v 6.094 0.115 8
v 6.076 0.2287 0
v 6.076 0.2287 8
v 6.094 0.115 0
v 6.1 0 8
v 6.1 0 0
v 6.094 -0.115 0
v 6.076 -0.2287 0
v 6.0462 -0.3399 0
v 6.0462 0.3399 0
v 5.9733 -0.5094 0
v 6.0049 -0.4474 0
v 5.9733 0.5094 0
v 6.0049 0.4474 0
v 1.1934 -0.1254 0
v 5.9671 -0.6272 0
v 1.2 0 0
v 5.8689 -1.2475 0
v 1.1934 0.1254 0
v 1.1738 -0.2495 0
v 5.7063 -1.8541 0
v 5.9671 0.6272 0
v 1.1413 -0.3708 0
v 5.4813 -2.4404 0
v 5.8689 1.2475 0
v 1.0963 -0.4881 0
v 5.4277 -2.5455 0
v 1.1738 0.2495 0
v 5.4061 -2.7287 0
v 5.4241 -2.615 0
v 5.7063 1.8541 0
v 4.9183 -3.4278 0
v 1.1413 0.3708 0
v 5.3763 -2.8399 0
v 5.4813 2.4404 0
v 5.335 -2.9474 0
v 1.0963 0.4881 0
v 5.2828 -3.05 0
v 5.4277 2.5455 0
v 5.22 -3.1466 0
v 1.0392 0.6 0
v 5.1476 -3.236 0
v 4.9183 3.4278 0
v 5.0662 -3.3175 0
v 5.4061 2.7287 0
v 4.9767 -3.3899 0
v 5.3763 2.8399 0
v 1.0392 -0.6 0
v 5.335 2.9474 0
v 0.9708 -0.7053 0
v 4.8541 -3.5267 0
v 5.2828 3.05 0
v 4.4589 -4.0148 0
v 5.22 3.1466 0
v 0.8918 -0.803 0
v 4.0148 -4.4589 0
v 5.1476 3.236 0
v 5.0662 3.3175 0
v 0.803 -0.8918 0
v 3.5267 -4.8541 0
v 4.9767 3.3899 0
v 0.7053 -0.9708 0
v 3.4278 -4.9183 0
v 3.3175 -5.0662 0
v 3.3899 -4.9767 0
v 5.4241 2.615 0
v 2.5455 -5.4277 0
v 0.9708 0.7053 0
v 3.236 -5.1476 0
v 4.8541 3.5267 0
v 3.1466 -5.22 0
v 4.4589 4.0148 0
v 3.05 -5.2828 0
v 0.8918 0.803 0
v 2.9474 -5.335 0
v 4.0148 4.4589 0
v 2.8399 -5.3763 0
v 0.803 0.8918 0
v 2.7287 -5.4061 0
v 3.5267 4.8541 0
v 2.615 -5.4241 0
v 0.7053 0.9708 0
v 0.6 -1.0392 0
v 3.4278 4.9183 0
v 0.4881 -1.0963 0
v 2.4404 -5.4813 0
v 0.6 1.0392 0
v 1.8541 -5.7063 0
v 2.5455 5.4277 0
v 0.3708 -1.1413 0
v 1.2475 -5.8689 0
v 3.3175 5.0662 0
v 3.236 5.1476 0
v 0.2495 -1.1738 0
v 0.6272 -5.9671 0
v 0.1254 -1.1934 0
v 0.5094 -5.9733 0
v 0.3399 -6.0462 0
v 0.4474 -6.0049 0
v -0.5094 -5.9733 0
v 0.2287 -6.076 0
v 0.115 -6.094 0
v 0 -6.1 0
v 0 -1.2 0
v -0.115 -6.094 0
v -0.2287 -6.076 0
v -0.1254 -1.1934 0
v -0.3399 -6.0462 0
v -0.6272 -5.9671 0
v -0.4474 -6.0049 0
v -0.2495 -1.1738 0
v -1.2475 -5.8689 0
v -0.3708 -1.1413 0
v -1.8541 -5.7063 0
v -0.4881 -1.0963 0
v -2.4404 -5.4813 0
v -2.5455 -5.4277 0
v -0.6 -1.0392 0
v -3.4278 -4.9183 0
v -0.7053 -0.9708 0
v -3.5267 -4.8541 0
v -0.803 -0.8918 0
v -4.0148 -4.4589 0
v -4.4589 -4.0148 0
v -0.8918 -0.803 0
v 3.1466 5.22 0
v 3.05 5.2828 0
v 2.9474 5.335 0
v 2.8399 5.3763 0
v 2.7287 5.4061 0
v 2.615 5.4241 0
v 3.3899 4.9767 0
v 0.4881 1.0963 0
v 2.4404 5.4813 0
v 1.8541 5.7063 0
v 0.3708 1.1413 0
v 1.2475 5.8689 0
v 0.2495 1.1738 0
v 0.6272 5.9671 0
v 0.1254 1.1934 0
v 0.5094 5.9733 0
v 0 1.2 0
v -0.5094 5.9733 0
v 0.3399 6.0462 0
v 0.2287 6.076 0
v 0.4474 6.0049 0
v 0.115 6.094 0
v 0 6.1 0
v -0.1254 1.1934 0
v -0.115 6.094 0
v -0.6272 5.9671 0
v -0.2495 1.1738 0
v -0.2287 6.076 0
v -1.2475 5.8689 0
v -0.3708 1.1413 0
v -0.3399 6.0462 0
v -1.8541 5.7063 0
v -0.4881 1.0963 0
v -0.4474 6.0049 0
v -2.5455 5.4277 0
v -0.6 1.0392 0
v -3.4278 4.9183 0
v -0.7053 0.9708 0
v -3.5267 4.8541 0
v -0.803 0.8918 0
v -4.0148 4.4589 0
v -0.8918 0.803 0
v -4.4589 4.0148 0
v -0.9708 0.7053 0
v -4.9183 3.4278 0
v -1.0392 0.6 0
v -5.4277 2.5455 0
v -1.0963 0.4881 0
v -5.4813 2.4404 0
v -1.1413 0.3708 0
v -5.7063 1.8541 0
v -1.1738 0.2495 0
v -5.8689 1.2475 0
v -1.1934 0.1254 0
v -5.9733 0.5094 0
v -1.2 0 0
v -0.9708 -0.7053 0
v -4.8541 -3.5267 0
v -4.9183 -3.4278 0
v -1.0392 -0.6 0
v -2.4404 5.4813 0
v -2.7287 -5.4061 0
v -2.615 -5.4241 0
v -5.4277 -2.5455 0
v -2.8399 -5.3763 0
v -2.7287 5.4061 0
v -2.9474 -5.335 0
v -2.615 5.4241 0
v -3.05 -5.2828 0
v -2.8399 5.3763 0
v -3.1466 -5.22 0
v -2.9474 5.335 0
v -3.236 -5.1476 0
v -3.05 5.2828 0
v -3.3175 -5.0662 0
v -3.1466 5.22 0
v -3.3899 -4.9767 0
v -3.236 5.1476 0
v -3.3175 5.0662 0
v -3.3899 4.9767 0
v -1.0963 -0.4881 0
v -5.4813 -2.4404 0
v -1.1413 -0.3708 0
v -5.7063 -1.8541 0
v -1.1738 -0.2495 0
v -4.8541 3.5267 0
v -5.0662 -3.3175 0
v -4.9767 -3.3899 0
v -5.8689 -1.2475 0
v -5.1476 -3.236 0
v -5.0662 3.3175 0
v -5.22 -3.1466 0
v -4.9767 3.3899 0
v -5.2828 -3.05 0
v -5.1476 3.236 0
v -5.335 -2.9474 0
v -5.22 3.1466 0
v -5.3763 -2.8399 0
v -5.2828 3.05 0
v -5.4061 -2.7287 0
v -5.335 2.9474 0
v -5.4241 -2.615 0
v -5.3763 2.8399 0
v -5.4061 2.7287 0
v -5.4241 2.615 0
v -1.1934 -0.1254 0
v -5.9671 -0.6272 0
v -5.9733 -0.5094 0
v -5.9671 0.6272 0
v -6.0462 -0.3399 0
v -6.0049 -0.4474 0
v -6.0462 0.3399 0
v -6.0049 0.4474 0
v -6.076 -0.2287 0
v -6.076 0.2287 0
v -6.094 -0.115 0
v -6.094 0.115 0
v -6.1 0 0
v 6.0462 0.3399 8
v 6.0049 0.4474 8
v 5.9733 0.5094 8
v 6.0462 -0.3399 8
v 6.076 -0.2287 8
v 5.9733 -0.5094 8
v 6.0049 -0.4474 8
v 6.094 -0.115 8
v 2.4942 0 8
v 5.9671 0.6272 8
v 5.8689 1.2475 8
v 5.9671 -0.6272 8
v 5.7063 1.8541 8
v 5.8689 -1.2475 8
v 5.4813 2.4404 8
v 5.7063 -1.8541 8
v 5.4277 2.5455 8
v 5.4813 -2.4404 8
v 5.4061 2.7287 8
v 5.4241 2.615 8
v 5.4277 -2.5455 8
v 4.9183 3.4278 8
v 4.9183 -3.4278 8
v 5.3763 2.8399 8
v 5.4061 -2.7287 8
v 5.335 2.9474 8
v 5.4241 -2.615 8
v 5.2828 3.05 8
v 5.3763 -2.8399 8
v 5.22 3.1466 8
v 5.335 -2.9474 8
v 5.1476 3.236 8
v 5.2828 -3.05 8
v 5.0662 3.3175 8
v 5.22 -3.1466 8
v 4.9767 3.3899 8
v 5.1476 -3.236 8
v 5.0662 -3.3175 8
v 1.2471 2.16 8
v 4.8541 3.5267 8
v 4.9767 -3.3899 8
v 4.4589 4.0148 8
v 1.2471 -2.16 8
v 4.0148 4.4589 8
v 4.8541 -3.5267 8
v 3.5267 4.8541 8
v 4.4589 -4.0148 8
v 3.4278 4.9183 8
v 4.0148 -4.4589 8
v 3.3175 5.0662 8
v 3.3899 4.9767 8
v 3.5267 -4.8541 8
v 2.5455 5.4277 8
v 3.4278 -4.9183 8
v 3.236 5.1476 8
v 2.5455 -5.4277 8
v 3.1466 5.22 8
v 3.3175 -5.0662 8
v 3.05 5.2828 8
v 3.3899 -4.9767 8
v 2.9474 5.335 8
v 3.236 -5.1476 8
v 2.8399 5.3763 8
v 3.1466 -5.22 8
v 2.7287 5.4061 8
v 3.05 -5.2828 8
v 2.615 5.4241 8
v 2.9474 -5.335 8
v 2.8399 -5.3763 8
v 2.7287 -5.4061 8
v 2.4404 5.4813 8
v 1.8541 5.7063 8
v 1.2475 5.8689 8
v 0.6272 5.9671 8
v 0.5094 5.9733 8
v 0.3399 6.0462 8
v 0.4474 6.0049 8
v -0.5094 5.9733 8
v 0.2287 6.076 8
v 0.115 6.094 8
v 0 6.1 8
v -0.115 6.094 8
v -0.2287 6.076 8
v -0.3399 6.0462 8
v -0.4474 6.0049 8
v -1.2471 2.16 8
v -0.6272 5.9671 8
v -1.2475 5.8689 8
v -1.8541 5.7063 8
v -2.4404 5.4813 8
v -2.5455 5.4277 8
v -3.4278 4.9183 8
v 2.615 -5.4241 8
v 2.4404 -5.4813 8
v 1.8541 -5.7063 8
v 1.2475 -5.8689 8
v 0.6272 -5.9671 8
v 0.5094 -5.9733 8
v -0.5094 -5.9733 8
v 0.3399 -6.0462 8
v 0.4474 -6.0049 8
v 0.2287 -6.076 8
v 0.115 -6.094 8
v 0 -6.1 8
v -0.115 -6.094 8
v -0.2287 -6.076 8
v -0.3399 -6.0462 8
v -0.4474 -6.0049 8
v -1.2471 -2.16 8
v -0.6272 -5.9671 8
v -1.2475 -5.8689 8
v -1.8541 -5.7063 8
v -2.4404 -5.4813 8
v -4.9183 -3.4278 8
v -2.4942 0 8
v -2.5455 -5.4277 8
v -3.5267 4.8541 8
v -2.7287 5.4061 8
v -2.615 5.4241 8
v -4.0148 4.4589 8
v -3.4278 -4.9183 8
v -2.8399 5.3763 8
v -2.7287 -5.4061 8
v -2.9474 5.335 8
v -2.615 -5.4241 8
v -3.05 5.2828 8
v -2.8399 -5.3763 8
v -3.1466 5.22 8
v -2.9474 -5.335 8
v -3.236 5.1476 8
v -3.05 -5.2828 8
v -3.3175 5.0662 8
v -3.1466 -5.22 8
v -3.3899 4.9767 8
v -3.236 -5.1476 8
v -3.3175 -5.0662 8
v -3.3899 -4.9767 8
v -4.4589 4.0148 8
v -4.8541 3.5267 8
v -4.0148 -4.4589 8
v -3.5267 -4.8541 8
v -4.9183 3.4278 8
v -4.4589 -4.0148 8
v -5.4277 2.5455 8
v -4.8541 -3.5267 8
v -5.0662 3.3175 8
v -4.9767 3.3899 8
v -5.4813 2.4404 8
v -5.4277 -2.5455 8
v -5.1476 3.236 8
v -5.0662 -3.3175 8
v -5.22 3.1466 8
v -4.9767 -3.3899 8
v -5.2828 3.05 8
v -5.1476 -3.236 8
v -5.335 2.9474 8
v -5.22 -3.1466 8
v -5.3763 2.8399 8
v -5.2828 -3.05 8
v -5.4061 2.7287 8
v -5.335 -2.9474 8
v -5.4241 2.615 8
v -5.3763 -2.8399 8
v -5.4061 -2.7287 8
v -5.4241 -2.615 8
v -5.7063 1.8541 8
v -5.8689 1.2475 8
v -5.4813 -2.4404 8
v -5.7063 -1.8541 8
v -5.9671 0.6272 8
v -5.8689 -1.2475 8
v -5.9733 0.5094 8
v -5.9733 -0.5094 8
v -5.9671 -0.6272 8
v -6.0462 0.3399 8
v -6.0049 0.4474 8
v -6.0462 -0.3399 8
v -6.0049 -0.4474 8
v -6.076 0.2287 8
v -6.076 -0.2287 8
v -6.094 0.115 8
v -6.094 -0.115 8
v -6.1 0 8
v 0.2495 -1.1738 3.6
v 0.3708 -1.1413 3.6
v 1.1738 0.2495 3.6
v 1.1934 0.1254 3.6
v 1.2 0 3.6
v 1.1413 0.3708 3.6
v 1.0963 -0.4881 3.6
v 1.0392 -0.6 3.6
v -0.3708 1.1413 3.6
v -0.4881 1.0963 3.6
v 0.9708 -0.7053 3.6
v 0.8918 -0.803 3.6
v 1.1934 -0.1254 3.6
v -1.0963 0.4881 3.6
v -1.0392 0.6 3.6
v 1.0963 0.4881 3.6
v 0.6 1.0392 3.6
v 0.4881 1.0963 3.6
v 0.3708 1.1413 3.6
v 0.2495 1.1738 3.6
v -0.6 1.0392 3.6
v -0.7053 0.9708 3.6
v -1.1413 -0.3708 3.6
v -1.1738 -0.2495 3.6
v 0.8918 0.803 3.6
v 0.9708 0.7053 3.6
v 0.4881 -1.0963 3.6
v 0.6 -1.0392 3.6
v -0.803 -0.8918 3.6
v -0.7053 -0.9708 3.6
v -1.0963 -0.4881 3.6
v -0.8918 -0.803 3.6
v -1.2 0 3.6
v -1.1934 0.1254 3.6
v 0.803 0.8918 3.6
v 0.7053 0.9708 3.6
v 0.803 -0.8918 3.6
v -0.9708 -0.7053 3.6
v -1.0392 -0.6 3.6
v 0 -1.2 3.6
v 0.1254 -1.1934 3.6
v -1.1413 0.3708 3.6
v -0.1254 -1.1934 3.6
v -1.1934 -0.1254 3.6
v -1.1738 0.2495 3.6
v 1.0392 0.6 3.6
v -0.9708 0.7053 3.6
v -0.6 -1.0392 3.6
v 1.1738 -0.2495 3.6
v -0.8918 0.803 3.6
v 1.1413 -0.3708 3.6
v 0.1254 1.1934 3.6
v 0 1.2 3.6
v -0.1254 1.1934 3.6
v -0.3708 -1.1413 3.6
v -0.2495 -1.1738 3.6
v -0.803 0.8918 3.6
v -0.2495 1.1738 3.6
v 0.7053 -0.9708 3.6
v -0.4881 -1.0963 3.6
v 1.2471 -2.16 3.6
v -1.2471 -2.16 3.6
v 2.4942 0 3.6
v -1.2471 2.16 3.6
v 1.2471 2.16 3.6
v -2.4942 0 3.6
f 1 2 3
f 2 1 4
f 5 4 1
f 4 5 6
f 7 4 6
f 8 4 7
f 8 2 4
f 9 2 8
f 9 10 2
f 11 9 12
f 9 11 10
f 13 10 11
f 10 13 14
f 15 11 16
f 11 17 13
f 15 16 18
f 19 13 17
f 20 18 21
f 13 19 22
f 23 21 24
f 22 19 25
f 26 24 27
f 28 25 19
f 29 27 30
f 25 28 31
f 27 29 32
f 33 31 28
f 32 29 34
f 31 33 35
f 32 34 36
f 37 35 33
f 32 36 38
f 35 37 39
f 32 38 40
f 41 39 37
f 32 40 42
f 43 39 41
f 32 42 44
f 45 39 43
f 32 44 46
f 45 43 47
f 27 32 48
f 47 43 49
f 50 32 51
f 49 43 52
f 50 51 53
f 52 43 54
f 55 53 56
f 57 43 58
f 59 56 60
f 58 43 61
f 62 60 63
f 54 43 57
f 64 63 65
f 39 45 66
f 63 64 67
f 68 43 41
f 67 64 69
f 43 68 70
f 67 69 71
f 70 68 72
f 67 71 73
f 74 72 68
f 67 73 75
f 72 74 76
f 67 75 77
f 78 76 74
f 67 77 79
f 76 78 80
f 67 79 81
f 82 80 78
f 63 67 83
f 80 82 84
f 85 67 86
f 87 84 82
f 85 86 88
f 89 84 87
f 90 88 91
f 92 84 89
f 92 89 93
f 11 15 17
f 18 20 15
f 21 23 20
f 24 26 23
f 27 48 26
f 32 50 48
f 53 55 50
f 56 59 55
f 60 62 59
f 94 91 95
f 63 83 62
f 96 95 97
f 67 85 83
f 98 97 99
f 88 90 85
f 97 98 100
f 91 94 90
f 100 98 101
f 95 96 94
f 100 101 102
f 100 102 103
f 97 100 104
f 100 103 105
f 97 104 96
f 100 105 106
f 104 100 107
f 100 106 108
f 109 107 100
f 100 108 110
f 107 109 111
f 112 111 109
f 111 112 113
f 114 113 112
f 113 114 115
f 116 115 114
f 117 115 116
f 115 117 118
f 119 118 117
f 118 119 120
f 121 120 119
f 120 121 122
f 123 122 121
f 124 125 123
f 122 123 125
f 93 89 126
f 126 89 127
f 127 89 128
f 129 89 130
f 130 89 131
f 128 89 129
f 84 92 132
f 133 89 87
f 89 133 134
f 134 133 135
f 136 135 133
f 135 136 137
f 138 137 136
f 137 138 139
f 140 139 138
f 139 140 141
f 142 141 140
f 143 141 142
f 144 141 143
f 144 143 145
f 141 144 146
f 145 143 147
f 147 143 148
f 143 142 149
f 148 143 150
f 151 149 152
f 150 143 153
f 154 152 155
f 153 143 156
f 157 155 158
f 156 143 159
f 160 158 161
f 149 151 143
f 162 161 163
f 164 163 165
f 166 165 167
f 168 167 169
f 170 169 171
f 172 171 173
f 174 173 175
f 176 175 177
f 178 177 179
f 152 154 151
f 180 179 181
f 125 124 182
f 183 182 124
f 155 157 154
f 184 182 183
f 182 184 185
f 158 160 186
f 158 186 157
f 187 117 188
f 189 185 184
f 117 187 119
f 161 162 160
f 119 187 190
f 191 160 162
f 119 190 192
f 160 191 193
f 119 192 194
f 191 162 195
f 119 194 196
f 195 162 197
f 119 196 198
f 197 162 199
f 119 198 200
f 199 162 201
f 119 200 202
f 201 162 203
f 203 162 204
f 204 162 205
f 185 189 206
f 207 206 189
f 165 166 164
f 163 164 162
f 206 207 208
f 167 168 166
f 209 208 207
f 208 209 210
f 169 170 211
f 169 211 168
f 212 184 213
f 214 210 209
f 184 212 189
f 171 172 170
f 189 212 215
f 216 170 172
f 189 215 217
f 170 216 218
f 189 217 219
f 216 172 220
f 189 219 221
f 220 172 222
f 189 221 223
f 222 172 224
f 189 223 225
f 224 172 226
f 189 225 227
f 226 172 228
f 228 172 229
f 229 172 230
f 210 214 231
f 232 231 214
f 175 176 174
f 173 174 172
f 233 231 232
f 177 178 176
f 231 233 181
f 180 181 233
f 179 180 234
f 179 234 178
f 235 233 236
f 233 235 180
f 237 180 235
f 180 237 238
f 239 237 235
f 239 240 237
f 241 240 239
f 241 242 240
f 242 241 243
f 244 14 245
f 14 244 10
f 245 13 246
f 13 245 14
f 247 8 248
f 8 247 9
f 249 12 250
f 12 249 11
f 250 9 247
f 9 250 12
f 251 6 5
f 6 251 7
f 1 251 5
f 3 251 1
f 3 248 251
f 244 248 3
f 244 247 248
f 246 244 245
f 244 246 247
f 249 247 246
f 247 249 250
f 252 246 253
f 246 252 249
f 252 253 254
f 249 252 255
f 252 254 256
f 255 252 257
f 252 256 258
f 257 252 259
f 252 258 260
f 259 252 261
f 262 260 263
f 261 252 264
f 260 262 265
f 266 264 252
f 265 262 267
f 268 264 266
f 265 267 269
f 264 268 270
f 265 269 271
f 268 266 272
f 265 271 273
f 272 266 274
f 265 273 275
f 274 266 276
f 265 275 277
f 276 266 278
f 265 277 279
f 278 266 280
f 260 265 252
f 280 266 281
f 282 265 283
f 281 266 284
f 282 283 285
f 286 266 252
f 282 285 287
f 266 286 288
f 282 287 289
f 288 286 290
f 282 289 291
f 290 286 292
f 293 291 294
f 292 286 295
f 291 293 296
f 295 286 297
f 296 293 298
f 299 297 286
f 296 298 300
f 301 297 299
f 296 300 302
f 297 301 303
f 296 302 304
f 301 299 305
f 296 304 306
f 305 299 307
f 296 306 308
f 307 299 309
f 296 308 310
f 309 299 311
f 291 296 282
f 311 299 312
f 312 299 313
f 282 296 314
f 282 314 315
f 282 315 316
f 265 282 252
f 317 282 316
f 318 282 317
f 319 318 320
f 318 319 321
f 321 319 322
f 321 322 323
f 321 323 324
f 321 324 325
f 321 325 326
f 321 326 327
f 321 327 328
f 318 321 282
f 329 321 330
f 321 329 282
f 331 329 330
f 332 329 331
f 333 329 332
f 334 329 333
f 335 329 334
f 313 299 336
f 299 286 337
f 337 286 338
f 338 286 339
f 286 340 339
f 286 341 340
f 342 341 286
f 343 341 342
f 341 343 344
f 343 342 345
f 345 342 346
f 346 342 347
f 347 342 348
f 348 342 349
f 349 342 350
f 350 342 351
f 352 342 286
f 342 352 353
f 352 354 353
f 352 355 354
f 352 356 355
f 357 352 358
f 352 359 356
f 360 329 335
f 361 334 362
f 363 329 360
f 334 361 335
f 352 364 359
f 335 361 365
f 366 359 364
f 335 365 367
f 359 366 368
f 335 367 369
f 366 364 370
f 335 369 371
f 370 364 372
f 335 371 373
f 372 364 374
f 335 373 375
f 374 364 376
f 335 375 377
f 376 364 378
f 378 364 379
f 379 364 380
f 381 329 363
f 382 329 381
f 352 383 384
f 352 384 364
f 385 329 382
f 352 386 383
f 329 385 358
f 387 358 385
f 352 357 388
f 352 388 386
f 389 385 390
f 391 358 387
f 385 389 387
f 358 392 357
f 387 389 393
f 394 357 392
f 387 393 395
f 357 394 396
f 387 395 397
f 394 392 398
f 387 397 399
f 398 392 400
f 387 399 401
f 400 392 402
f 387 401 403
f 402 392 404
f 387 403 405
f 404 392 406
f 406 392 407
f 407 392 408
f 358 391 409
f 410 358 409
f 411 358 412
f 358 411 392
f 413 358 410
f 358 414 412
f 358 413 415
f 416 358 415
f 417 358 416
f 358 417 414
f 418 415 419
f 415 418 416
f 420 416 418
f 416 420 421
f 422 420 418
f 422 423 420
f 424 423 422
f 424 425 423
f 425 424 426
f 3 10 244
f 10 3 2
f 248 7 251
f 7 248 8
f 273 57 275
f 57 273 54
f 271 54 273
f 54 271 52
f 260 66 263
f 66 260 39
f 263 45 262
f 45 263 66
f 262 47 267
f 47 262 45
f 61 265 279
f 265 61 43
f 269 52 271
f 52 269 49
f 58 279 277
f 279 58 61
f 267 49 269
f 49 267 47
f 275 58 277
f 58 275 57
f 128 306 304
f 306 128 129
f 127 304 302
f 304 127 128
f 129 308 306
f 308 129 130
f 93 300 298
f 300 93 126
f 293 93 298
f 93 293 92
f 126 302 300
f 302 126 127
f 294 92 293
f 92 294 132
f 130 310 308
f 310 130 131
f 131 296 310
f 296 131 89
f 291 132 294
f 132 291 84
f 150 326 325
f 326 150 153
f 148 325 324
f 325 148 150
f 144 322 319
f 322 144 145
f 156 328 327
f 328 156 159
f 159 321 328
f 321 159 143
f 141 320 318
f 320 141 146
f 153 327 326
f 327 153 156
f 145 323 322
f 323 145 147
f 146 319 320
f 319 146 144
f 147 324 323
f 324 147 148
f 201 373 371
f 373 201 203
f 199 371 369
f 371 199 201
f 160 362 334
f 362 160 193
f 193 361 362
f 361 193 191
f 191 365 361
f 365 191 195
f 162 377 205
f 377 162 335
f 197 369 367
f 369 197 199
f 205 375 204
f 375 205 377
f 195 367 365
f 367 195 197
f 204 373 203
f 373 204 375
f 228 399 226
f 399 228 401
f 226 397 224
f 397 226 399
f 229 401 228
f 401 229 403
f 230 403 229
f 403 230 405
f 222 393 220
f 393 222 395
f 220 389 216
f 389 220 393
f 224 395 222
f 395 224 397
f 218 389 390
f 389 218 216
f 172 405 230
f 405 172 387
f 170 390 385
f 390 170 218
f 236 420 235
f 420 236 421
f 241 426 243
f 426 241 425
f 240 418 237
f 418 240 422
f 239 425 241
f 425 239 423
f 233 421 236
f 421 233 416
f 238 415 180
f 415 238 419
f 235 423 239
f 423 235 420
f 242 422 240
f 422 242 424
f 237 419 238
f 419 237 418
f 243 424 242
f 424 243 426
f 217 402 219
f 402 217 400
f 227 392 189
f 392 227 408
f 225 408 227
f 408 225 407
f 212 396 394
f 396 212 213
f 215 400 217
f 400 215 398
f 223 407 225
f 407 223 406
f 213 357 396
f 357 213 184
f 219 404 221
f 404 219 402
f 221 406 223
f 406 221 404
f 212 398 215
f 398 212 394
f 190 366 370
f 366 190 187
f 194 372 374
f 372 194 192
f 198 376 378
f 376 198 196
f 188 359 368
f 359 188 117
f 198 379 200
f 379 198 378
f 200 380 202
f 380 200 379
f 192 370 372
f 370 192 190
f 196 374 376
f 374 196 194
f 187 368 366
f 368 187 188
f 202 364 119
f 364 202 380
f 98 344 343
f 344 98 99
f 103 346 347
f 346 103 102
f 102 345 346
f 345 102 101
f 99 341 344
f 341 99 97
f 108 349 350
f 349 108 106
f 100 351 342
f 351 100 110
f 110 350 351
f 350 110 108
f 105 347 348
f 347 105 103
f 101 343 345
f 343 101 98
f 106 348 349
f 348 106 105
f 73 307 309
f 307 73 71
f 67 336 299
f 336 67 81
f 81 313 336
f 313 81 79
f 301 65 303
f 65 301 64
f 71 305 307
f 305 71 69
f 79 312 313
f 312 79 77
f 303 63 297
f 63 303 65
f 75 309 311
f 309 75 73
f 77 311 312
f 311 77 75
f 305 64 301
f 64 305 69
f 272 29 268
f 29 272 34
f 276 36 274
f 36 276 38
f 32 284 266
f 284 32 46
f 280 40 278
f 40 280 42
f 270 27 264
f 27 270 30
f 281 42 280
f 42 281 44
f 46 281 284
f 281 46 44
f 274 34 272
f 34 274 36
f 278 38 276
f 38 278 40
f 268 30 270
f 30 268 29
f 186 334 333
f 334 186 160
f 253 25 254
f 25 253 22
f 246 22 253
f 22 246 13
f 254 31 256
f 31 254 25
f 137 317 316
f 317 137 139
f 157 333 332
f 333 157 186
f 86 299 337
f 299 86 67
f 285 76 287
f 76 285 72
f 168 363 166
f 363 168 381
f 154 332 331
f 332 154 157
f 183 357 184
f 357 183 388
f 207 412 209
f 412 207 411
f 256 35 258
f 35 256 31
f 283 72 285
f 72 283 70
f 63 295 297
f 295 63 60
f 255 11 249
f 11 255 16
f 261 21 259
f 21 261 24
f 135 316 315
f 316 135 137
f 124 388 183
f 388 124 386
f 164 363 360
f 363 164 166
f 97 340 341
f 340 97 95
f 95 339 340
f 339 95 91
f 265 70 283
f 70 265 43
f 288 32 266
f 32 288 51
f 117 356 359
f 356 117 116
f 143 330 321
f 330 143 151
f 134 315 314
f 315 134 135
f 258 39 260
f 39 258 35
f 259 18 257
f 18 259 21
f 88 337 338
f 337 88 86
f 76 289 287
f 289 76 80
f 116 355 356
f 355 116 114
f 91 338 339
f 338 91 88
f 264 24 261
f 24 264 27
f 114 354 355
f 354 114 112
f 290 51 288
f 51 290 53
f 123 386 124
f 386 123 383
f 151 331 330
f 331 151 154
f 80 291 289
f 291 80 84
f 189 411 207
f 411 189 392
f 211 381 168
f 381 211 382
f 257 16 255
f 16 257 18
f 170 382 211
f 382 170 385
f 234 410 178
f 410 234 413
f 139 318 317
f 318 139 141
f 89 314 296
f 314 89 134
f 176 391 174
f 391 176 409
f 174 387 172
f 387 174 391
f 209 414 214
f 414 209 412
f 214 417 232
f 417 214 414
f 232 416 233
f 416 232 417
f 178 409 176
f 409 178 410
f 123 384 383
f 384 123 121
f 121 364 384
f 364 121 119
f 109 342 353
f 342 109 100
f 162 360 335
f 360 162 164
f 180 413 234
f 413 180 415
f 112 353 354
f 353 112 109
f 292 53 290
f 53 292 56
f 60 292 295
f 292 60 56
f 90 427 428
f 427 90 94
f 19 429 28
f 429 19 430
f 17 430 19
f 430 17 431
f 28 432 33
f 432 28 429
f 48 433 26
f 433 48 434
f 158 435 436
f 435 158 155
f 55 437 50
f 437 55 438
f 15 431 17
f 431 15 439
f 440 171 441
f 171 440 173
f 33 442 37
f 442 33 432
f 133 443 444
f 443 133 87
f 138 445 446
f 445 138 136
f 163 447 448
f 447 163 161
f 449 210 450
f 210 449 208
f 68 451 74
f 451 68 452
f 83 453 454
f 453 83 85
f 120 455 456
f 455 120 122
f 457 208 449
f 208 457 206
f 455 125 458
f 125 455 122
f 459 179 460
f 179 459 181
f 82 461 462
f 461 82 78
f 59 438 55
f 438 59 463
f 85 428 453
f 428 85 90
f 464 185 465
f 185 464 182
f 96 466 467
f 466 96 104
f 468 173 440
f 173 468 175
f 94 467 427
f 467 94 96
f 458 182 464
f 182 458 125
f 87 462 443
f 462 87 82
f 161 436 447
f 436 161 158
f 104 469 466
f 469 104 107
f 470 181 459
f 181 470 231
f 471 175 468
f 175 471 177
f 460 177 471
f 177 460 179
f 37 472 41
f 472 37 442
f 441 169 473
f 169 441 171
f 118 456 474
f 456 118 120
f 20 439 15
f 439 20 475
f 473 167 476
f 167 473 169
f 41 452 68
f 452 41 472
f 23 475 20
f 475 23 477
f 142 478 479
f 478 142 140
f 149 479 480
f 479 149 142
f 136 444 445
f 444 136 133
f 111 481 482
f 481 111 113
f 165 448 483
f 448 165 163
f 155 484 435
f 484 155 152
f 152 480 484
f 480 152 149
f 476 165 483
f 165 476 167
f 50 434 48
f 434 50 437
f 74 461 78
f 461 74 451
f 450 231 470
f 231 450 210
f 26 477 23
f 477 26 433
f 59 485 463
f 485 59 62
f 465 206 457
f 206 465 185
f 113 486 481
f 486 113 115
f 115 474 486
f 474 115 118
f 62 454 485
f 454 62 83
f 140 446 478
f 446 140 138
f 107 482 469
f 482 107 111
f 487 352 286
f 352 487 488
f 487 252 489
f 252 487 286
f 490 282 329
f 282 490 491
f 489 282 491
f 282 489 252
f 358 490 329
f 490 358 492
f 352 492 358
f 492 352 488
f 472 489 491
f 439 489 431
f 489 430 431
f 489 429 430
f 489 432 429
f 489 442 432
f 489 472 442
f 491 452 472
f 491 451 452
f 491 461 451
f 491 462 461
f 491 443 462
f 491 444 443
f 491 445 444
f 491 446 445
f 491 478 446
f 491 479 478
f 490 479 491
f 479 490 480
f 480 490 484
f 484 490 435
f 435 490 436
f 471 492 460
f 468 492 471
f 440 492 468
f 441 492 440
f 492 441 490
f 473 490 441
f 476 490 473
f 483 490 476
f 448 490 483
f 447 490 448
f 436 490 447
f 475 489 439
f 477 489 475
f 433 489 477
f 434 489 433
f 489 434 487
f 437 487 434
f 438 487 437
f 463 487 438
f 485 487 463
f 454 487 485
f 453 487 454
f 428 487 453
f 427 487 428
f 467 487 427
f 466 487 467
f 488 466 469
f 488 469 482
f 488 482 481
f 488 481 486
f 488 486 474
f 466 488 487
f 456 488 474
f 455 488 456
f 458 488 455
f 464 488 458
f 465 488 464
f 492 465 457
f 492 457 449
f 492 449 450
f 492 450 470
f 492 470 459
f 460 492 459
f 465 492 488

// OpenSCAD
// Knurled-style thumb knob with hex socket.
$fn = 60;
eps = 0.02;
thread_d = 2.4;
knob_d = 12;
knob_h = 8;
socket_flat = thread_d * 1.8;
difference() {
    union() {
        cylinder(d = knob_d, h = knob_h);
        for (i = [0 : 11]) rotate([0, 0, i * 30]) translate([knob_d / 2 - 1, 0, 0]) cylinder(d = 2.2, h = knob_h);
    }
    translate([0, 0, -eps]) cylinder(d = thread_d, h = knob_h + 2 * eps);
    translate([0, 0, knob_h - knob_h * 0.55]) cylinder(d = socket_flat / cos(30), h = knob_h * 0.55 + eps, $fn = 6);
}
